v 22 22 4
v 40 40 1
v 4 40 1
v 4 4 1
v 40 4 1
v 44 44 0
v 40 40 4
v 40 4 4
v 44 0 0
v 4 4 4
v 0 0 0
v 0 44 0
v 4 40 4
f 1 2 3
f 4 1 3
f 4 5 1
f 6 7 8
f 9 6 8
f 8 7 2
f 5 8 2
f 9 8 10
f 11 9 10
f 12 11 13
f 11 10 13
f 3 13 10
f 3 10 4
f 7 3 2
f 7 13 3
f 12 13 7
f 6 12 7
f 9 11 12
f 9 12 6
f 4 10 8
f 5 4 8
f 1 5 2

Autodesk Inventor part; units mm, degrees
ref_plane "YZ Plane" through (0, 0, 0) normal (1, 0, 0) x (0, 1, 0)
ref_plane "XZ Plane" through (0, 0, 0) normal (0, 1, 0) x (-1, 0, 0)
ref_plane "XY Plane" through (0, 0, 0) normal (0, 0, 1) x (1, 0, 0)
sketch "Sketch1" plane through (0, 0, 0) normal (0, 0, 1) x (1, 0, 0)
  line L0 (0, 0) -> (44, 0)
  line L1 (44, 0) -> (44, 44)
  line L2 (44, 44) -> (0, 44)
  line L3 (0, 44) -> (0, 0)
  dimension "d0" = 44
  dimension "d1" = 44
extrude "Extrusion1" add sketch "Sketch1" along normal blind 4
chamfer "Chamfer1" distance 4 angle 45 4 edges at (22, 44, 4) (44, 22, 4) (22, 0, 4) (0, 22, 4)
ref_plane "Work Plane1" through (0, 22, 22) normal (0, -1, 0) x (1, 0, 0)
sketch "Sketch5" plane through (0, 22, 22) normal (0, -1, 0) x (1, 0, 0)
  line L0 (40, -18) -> (4, -18) projected
  line L1 (4, -18) -> (0, -22) projected
  line L2 (0, -22) -> (44, -22) projected
  line L3 (40, -18) -> (44, -22) projected
  line L4 (4, -18) -> (4, -22)
  line L5 (40, -18) -> (40, -22)
  line L6 (40, -22) -> (40, -21)
  line L7 (40, -21) -> (22, -18)
  line L8 (4, -22) -> (4, -21)
  line L9 (22, -18) -> (4, -21)
  dimension "d25" = 1
extrude "Extrusion4" cut sketch "Sketch5" against normal mid plane 36 contours L5 L7 L0 | L9 L4 L0
ref_plane "Work Plane2" through (22, 0, 22) normal (-1, 0, 0) x (0, -1, 0)
sketch "Sketch6" plane through (22, 0, 22) normal (-1, 0, 0) x (0, -1, 0)
  line L0 (-4, -18) -> (-40, -18) projected
  line L1 (-4, -18) -> (-4, -21) projected
  line L2 (-40, -21) -> (-40, -18) projected
  line L3 (-40, -21) -> (-4, -21) projected
  line L4 (-4, -21) -> (-22, -18)
  line L5 (-40, -18) -> (-4, -18) projected
  line L6 (-4, -21) -> (-40, -21) projected
  line L7 (-40, -21) -> (-22, -18)
  point P0 (0, -22)
extrude "Extrusion5" cut sketch "Sketch6" along normal mid plane 36 contours L1 L4 L0 | L7 L2 L0
properties part number "clear-square-inset"
